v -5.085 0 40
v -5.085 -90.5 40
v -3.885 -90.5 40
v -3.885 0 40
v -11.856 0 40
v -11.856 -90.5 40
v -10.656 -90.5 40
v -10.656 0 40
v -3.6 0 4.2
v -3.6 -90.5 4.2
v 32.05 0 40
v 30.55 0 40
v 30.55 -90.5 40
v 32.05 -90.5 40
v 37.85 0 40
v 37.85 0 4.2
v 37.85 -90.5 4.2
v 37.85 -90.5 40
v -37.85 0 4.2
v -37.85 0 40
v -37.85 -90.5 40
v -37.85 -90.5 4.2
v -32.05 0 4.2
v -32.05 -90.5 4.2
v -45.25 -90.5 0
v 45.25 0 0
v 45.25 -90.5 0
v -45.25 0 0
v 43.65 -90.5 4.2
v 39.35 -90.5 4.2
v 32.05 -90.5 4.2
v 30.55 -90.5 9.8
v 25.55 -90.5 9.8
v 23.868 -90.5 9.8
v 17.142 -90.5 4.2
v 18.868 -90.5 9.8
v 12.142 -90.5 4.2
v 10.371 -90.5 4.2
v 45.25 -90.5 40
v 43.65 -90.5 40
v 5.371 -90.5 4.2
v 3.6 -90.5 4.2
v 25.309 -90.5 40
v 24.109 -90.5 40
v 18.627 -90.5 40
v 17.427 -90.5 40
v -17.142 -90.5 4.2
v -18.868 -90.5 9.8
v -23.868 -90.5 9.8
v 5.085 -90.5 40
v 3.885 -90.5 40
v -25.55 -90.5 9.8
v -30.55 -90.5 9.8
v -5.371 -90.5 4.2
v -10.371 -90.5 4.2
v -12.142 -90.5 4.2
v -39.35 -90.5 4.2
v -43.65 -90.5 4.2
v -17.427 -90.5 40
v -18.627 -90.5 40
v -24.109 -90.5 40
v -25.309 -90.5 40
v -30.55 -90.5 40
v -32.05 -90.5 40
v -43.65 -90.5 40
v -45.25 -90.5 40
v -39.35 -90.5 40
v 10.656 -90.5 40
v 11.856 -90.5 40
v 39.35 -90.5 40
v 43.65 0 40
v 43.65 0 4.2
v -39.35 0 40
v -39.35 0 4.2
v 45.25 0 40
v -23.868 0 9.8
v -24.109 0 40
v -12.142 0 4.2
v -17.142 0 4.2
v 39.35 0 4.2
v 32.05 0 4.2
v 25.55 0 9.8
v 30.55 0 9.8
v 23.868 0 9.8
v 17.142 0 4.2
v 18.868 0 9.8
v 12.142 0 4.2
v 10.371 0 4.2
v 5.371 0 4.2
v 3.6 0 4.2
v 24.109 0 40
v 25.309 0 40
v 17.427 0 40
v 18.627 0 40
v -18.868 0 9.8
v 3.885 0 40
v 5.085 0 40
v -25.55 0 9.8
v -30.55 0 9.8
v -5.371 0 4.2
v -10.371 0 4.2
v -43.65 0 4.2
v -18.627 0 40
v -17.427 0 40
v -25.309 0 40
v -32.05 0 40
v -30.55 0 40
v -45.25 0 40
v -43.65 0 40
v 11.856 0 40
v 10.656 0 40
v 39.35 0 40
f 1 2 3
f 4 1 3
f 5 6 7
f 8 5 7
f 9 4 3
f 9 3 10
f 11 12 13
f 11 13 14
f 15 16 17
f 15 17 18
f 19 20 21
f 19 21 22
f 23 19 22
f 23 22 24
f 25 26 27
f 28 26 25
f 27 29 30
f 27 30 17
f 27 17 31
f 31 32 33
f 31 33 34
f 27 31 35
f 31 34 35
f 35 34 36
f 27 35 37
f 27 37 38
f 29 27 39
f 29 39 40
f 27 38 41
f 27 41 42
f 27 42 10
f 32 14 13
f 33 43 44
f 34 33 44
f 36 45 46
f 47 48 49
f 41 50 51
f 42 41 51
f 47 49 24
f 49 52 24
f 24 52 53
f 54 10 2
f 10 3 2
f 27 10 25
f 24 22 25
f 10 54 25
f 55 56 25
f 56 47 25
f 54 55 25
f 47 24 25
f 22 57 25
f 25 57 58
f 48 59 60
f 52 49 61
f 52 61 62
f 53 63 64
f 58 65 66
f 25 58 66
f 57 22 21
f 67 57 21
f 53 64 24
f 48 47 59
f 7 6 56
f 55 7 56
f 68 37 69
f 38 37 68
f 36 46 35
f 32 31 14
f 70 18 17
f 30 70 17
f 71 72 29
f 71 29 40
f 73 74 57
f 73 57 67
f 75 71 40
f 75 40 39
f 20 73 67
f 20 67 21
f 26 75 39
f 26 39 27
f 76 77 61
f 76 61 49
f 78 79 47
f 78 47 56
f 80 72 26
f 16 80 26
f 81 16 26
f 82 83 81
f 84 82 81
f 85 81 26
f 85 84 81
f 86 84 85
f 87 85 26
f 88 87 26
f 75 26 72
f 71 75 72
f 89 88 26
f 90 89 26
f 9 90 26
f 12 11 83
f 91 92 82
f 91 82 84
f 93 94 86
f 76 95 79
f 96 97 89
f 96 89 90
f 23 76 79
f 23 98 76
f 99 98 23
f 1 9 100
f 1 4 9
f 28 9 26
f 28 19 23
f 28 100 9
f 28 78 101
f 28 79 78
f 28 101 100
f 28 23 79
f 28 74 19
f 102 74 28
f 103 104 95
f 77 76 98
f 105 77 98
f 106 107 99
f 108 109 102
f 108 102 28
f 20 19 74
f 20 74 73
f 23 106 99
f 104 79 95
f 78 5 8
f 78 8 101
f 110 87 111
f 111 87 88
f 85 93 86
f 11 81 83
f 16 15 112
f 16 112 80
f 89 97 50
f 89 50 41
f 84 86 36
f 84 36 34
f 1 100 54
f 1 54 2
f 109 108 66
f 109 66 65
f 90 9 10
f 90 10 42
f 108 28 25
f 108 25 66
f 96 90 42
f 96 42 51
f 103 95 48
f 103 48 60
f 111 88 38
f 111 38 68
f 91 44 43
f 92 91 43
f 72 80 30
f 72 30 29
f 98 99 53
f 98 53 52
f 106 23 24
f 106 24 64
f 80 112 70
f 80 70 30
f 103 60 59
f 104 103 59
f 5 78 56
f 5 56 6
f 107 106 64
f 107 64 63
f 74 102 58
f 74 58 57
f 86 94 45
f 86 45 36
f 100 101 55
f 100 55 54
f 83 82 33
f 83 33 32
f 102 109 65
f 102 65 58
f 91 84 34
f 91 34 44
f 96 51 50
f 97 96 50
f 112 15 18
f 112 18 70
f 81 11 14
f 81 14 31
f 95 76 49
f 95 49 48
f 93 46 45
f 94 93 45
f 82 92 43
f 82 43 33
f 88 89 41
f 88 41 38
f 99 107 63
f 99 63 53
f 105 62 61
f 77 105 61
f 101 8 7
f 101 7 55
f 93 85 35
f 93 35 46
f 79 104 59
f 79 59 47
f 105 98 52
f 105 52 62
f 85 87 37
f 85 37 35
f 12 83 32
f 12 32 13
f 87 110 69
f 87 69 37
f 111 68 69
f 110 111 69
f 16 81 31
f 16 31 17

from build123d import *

# Parameters (mm, degrees)
PAD_DEPTH = 90.5


with BuildPart() as part:
    # Sketch → Pad (new body)
    with BuildSketch(Plane.XZ):
        Polygon((-45.25, 0), (-45.25, 40), (-43.65, 40), (-43.65, 4.2), (-39.35, 4.2), (-39.35, 40), (-37.85, 40), (-37.85, 4.2), (-32.05, 4.2), (-32.05, 40), (-30.55, 40), (-30.55, 9.8), (-25.55, 9.8), (-25.309162, 40), (-24.109162, 40), (-23.868323, 9.8), (-18.868323, 9.8), (-18.627485, 40), (-17.427485, 40), (-17.141988, 4.2), (-12.141988, 4.2), (-11.856491, 40), (-10.656491, 40), (-10.370994, 4.2), (-5.370994, 4.2), (-5.085497, 40), (-3.885497, 40), (-3.6, 4.2), (3.6, 4.2), (3.885497, 40), (5.085497, 40), (5.370994, 4.2), (10.370994, 4.2), (10.656491, 40), (11.856491, 40), (12.141988, 4.2), (17.141988, 4.2), (17.427485, 40), (18.627485, 40), (18.868323, 9.8), (23.868323, 9.8), (24.109162, 40), (25.309162, 40), (25.55, 9.8), (30.55, 9.8), (30.55, 40), (32.05, 40), (32.05, 4.2), (37.85, 4.2), (37.85, 40), (39.35, 40), (39.35, 4.2), (43.65, 4.2), (43.65, 40), (45.25, 40), (45.25, 0), align=None)
    extrude(amount=PAD_DEPTH)


solid = part.part
